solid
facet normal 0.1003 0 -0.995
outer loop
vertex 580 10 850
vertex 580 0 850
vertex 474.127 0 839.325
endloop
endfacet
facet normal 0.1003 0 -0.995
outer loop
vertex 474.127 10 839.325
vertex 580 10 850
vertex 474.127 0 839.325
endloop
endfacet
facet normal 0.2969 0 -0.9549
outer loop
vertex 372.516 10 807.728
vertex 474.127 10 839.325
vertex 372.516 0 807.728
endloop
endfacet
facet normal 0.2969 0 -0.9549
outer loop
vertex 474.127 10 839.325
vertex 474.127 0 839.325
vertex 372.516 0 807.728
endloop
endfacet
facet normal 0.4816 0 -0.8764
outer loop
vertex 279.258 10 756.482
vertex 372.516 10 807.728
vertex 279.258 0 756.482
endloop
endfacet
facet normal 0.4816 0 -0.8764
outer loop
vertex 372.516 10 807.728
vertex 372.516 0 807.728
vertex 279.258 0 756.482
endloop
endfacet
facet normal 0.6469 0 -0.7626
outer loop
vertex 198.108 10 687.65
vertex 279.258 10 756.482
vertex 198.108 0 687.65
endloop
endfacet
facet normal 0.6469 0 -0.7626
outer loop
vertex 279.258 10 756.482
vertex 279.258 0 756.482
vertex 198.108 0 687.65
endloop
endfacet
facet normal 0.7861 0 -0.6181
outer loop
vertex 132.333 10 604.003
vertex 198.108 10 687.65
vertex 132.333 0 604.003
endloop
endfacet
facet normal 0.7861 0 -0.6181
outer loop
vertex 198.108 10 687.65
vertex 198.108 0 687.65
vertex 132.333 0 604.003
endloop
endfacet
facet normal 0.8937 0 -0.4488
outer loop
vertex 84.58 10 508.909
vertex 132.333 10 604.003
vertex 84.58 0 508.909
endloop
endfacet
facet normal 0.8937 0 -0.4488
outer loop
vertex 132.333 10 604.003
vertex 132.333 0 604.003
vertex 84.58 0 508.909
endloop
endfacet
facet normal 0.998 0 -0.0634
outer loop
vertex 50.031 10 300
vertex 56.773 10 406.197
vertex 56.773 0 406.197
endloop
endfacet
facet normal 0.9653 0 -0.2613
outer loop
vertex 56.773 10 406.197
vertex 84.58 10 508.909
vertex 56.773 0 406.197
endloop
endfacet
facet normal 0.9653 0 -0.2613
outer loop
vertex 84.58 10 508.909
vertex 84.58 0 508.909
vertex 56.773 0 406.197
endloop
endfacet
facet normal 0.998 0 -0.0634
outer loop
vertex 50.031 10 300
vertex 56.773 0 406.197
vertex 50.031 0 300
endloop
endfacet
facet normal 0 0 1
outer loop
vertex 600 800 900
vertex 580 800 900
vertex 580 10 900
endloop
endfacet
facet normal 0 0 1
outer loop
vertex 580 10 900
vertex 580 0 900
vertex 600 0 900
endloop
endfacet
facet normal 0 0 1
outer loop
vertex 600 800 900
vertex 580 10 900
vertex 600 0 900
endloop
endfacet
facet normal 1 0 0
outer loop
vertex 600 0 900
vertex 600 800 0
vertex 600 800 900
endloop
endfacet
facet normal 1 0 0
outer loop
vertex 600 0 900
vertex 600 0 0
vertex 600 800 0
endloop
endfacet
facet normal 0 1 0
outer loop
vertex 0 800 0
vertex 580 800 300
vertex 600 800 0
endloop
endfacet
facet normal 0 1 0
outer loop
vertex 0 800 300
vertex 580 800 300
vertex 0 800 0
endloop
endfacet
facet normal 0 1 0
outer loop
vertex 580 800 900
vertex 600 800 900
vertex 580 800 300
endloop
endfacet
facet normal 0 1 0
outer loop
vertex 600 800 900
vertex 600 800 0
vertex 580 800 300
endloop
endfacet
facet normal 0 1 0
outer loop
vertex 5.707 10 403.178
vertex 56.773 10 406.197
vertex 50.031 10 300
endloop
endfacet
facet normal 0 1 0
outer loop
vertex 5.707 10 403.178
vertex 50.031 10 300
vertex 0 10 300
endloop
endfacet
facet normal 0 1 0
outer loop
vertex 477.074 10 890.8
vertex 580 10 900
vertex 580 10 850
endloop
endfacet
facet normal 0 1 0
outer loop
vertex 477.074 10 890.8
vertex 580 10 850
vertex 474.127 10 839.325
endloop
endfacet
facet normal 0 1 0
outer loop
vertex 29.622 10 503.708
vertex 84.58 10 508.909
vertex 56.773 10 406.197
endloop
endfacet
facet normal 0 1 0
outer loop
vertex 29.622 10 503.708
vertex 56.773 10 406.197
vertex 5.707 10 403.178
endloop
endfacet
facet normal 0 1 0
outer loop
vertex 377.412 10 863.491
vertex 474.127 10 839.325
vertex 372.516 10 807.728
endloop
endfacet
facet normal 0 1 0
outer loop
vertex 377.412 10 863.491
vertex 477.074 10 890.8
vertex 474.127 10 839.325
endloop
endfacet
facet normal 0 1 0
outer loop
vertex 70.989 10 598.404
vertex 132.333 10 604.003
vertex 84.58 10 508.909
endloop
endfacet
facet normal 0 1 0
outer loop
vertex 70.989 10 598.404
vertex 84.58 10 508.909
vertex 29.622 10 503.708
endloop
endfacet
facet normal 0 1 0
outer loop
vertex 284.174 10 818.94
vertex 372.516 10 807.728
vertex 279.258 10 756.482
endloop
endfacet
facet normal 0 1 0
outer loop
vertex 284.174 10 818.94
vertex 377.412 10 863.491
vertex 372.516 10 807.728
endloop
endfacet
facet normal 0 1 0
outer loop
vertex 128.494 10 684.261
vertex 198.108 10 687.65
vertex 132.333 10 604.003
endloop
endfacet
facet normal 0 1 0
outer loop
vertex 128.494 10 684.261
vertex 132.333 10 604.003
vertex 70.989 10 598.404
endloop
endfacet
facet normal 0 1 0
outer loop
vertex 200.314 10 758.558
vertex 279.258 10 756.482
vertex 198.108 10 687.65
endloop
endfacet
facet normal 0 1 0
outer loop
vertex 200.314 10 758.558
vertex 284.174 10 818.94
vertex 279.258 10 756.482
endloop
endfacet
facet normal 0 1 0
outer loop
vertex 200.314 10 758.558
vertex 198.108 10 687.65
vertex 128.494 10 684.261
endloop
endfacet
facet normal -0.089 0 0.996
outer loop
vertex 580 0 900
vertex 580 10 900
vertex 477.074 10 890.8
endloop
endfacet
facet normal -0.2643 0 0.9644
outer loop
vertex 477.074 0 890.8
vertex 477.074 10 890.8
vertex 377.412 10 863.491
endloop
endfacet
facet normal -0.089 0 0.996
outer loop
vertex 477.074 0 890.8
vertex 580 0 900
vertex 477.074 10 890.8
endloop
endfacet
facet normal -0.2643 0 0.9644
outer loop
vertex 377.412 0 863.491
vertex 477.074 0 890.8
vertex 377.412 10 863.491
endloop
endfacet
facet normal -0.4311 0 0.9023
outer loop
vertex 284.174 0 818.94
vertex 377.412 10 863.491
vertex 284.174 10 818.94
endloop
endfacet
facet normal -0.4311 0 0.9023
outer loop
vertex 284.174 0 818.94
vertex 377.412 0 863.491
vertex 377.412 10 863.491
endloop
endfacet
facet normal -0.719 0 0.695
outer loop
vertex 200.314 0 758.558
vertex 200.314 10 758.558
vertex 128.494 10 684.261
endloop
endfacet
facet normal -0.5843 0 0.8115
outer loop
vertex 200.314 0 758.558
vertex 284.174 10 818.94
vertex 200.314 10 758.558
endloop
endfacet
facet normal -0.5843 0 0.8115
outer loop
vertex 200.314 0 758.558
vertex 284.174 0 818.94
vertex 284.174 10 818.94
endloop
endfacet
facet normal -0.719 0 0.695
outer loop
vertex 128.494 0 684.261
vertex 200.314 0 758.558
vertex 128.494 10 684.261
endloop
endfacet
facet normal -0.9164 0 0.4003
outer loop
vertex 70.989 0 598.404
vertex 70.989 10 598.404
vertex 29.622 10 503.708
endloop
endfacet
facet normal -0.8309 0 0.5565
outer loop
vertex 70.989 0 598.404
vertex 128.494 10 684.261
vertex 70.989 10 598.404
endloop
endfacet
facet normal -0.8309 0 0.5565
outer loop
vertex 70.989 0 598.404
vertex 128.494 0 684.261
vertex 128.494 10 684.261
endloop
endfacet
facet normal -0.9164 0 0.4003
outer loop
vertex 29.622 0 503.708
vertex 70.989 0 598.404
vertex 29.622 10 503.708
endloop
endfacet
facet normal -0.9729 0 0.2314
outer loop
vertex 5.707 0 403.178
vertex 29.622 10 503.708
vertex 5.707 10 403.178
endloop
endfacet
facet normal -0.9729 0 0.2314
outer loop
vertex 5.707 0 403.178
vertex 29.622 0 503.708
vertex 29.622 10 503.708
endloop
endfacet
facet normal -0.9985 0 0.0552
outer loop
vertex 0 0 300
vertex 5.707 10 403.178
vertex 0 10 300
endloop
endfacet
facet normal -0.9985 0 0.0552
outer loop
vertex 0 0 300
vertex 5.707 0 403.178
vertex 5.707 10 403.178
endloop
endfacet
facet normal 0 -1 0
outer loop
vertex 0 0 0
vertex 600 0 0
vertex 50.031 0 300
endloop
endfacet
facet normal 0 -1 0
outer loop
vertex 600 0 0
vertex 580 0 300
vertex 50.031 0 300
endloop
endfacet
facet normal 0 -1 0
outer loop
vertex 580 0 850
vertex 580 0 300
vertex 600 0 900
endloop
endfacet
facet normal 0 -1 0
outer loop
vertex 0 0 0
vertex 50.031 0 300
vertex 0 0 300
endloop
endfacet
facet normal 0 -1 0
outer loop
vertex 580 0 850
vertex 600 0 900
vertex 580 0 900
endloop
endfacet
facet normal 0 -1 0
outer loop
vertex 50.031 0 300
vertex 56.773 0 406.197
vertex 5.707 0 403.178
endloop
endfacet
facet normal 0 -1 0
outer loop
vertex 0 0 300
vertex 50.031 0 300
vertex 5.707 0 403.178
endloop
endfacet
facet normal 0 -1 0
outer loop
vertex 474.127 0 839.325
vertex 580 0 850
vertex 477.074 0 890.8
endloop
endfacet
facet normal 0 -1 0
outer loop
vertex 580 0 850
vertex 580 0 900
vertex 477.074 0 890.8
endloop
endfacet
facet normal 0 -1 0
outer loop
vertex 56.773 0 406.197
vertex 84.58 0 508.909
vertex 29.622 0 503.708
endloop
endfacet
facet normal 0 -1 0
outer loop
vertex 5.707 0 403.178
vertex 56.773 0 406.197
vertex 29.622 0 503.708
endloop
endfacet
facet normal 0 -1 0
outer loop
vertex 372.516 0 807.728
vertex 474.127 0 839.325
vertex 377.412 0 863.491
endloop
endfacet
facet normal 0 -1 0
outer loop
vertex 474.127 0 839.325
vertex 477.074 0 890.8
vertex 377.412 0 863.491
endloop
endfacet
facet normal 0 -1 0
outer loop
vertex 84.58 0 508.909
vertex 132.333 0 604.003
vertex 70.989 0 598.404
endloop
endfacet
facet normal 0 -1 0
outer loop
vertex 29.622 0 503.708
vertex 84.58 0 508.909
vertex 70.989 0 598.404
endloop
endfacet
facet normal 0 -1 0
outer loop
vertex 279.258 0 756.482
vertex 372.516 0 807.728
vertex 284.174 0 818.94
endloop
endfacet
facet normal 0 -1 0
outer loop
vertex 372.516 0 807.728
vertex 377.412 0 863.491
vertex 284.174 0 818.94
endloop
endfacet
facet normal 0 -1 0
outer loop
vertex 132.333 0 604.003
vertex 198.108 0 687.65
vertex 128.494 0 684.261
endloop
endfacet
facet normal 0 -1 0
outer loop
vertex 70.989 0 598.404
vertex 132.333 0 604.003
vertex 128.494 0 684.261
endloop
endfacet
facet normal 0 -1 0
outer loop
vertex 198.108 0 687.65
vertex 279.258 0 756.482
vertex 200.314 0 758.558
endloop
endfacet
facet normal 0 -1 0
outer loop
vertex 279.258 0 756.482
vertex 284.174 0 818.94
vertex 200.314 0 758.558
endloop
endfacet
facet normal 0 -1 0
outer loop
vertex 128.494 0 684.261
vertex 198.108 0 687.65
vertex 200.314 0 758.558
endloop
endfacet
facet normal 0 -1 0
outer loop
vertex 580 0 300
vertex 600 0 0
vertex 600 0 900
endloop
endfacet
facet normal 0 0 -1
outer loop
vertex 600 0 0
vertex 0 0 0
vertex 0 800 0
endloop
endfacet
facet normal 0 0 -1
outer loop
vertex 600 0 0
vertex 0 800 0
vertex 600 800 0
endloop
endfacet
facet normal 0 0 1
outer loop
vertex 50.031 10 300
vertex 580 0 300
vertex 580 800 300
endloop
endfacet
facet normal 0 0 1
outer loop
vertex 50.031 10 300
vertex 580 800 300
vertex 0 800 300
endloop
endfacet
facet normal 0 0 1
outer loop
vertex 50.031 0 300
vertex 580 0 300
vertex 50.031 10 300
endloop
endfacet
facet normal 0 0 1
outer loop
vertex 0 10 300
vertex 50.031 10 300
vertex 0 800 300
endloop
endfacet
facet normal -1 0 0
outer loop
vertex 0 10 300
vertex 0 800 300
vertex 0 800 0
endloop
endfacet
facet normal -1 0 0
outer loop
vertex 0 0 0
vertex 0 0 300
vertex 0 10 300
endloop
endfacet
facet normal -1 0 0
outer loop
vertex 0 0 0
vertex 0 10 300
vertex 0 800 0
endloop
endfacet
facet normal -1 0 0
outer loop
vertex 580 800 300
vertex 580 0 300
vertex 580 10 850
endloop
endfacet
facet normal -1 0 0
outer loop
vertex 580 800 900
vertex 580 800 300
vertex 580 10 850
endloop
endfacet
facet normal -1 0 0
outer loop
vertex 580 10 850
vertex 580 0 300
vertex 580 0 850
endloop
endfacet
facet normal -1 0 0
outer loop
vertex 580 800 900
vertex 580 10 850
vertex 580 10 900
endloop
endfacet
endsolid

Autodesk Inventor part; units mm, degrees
ref_plane "YZ Plane" through (0, 0, 0) normal (1, 0, 0) x (0, 1, 0)
ref_plane "XZ Plane" through (0, 0, 0) normal (0, 1, 0) x (-1, 0, 0)
ref_plane "XY Plane" through (0, 0, 0) normal (0, 0, 1) x (1, 0, 0)
sketch "Sketch1" plane through (0, 0, 0) normal (0, 1, 0) x (-1, 0, 0)
  line L0 (0, 0) -> (-600, 0)
  line L1 (-600, 0) -> (-600, 300)
  line L2 (-600, 300) -> (0, 300)
  line L3 (0, 300) -> (0, 0)
  line L4 (0, 300) -> (-20, 300)
  line L5 (-600, 300) -> (-580, 300)
  line L6 (-580, 300) -> (-580, 900)
  line L7 (-580, 900) -> (-600, 900)
  line L8 (-600, 900) -> (-600, 300)
  dimension "d0" = 600
  dimension "d1" = 300
  dimension "d9" = 600
  dimension "d10" = 20
extrude "Extrusion1" add sketch "Sketch1" along normal blind 800
sketch "Sketch3" plane through (0, 0, 0) normal (0, 1, 0) x (-1, 0, 0)
  line L0 (0, 300) -> (-580, 300) projected
  line L1 (-580, 300) -> (-580, 900) projected
  line L2 (-580, 900) -> (-600, 900) projected
  line L3 (-600, 900) -> (-600, 0) projected
  line L4 (-600, 0) -> (0, 0) projected
  line L5 (0, 0) -> (0, 300) projected
  arc A0 (0, 300) -> (-580, 900) centre (-580, 319.6667) ccw
  arc A1 (-50.0314, 300) -> (-580, 850) centre (-580, 319.6667) ccw
  dimension "d11" = 50
extrude "Extrusion3" add sketch "Sketch3" along normal blind 10 contours L0 A1 L1 A0
equation "\"d9\" = d0"
properties part number "Electrical box 1"
